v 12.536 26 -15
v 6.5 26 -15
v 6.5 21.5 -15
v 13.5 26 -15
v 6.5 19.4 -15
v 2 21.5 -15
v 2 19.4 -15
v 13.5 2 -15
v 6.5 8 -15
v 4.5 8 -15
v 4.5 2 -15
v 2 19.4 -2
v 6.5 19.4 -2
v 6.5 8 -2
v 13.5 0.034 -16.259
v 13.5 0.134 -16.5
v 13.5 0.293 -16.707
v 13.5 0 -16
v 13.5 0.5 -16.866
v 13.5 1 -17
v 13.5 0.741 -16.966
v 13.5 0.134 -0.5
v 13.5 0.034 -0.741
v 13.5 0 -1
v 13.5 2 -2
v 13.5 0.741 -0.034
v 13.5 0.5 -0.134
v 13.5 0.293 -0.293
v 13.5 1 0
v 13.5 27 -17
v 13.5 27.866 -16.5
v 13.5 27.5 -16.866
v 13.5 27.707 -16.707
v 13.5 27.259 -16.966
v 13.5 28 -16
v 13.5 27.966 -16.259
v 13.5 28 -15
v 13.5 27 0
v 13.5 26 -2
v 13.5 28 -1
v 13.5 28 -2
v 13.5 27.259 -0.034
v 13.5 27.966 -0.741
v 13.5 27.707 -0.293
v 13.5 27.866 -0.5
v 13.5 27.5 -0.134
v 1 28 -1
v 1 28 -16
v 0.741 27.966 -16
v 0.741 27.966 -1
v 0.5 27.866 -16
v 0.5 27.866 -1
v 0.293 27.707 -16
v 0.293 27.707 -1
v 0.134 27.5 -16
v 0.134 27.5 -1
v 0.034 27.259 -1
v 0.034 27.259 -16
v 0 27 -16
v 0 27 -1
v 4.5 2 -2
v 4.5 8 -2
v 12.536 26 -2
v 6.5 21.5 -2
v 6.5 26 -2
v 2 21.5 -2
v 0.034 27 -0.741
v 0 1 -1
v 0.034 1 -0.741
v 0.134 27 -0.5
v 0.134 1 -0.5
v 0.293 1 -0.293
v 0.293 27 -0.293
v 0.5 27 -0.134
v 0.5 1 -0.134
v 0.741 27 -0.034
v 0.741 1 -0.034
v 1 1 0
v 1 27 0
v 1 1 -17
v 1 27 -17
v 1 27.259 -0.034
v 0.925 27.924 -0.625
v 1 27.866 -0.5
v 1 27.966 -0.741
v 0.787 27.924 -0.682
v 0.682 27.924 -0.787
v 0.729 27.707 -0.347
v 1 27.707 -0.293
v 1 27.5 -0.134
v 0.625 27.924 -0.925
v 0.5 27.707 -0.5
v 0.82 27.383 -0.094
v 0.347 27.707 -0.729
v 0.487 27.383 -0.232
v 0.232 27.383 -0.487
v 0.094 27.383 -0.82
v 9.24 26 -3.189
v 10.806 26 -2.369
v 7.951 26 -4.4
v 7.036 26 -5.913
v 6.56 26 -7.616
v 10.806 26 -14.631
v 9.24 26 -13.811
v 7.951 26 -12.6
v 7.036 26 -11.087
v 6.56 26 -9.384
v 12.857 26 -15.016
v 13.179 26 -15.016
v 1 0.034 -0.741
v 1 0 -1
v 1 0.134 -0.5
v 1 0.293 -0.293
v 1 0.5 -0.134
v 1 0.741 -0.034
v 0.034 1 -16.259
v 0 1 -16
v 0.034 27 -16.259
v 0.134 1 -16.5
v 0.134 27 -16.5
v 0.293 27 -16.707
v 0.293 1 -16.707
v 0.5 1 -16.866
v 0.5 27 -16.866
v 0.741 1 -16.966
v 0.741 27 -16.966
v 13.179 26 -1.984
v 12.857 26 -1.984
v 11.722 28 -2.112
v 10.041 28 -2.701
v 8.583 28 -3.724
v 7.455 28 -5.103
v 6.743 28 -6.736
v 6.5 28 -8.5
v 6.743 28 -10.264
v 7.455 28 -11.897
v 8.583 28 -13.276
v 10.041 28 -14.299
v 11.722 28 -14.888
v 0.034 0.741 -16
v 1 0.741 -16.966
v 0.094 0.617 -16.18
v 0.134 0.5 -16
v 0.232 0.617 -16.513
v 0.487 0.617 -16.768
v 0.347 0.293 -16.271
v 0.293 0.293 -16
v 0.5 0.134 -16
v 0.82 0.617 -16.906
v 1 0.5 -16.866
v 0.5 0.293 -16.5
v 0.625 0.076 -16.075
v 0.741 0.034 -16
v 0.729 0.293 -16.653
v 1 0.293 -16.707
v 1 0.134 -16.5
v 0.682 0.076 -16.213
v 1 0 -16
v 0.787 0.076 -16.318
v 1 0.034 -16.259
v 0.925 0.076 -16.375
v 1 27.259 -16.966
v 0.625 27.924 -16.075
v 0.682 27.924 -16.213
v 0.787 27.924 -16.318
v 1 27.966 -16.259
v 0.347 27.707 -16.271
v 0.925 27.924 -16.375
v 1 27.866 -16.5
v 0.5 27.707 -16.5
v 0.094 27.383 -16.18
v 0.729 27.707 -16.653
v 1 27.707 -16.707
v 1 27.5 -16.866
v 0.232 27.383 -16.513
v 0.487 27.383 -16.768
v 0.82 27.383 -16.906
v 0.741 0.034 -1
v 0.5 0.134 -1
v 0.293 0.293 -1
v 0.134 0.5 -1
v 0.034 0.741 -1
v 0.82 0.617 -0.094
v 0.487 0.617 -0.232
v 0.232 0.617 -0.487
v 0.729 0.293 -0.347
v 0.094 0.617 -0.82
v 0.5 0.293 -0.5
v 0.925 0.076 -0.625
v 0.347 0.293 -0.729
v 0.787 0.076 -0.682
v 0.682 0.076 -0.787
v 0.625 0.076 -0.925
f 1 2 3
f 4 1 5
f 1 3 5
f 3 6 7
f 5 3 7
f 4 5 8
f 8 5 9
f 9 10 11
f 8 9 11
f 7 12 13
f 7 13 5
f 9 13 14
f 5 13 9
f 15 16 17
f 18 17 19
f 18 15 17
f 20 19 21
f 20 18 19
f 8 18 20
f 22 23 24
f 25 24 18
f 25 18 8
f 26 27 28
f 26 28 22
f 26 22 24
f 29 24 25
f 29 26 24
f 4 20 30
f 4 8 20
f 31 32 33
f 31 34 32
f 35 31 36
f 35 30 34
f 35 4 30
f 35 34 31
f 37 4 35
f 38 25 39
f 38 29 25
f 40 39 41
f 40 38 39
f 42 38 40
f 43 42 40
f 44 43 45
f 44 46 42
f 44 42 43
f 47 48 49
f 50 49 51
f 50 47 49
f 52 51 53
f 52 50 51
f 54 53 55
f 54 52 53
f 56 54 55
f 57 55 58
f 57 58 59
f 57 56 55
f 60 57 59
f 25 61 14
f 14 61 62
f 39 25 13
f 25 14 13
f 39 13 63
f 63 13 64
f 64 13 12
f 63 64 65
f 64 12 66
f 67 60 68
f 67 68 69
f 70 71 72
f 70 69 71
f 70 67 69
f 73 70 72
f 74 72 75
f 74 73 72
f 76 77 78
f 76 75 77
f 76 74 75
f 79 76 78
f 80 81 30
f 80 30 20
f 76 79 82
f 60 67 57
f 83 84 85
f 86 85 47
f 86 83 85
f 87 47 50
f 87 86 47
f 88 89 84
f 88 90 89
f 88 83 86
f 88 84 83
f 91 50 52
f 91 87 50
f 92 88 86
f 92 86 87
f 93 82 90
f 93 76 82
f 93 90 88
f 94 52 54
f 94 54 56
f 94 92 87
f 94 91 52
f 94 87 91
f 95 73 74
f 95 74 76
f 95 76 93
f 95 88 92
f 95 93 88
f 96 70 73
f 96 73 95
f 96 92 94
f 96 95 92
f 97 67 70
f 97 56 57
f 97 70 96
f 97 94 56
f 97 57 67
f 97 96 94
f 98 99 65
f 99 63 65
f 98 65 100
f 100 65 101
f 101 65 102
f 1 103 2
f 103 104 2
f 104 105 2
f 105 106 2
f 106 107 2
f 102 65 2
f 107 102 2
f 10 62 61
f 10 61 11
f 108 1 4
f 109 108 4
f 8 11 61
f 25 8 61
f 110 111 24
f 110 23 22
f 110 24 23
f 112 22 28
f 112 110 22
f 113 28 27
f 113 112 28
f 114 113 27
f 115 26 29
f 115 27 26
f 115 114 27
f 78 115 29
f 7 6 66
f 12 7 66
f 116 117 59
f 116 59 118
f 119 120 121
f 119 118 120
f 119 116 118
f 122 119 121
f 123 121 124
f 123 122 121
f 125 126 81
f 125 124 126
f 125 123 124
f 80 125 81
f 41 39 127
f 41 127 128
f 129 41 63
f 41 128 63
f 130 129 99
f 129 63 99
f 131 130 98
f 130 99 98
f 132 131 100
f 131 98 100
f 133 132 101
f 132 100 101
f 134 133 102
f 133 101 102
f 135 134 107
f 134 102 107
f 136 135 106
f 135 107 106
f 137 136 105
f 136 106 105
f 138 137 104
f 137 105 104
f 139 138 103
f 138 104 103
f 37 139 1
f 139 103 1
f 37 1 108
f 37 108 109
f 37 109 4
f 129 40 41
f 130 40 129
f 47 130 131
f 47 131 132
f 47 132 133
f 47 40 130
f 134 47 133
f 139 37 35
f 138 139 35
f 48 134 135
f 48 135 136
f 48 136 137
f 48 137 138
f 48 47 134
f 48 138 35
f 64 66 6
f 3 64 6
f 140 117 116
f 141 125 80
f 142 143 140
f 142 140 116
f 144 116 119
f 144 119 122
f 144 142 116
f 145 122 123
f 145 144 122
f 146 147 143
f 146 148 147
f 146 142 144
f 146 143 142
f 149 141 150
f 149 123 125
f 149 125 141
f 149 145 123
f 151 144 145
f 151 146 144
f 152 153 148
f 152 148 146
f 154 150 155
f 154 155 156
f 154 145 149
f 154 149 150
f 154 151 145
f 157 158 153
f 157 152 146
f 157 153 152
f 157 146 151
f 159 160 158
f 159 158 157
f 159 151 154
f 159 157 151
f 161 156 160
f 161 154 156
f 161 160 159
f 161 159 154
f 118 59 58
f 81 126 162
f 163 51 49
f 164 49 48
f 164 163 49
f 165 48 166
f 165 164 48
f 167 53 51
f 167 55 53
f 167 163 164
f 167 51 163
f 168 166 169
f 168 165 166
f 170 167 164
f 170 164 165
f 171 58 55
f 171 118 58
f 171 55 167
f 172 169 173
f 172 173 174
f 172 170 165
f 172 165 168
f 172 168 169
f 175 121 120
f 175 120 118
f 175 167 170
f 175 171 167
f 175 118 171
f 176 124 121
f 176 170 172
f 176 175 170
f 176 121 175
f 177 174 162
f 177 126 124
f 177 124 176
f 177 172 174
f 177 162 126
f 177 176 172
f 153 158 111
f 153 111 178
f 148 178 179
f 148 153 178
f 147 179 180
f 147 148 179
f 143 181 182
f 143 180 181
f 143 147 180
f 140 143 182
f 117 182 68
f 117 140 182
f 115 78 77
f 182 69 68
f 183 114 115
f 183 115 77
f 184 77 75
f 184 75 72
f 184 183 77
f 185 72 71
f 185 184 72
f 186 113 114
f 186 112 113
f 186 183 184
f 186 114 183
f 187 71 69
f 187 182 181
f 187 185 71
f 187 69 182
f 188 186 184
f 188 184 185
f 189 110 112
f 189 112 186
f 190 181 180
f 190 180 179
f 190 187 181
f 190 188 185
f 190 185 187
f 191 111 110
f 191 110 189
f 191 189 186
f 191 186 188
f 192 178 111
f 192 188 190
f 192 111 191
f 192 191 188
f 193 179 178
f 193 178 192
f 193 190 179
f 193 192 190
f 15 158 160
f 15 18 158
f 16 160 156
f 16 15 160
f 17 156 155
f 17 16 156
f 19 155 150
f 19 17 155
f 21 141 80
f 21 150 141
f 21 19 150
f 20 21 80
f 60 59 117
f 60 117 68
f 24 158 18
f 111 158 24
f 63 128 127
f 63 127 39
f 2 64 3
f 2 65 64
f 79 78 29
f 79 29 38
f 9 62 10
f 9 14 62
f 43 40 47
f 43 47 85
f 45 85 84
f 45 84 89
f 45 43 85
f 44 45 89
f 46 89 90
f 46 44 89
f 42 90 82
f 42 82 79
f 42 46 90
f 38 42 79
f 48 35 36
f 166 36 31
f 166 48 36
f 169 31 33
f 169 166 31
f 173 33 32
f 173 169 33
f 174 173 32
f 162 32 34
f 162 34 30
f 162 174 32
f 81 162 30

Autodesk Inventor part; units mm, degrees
ref_plane "YZ Plane" through (0, 0, 0) normal (1, 0, 0) x (0, 1, 0)
ref_plane "XZ Plane" through (0, 0, 0) normal (0, 1, 0) x (-1, 0, 0)
ref_plane "XY Plane" through (0, 0, 0) normal (0, 0, 1) x (1, 0, 0)
sketch "Esquisse1" plane through (0, 0, 0) normal (1, 0, 0) x (0, 1, 0)
  line L0 (0, 0) -> (28, 0)
  line L1 (28, 0) -> (28, -17)
  line L2 (28, -17) -> (0, -17)
  line L3 (0, -17) -> (0, 0)
  line L4 (0, 0) -> (0, -2)
  line L5 (0, -2) -> (2, -2)
  line L6 (28, -17) -> (28, -15)
  line L7 (28, -15) -> (26, -15)
  line L8 (26, -15) -> (2, -15)
  line L9 (2, -15) -> (2, -2)
  line L10 (2, -2) -> (26, -2)
  line L11 (26, -2) -> (26, -15)
  dimension "d1" = 28
  dimension "d2" = 17
  dimension "d3" = 2
  dimension "d4" = 2
  dimension "d5" = 2
  dimension "d6" = 2
extrude "Extrusion1" add sketch "Esquisse1" along normal blind 13.5 contours L0 L1 L7 L11 L10 L5 L3 | L5 L9 L8 L7 L1 L2 L3
sketch "Esquisse2" plane through (0, 0, 0) normal (-1, 0, 0) x (0, 0, 1)
  line L0 (-2, 2) -> (-2, 26) projected
  line L1 (-2, 26) -> (-15, 26)
  line L2 (-15, 26) -> (-15, 2)
  line L3 (-15, 2) -> (-2, 2)
  line L4 (-2, 2) -> (-2, 26)
  point P0 (0, 0)
extrude "Extrusion2" add sketch "Esquisse2" against normal blind 2
sketch "Esquisse3" plane through (2, 0, 0) normal (1, 0, 0) x (0, 0, -1)
  line L0 (15, 2) -> (2, 2) projected
  line L1 (2, 2) -> (2, 19.4)
  line L2 (2, 2) -> (2, 26) projected
  line L3 (2, 19.4) -> (2, 21.5)
  line L4 (2, 21.5) -> (2, 26)
  line L5 (2, 21.5) -> (2, 26)
  line L6 (15, 2) -> (2, 2)
  line L7 (2, 2) -> (2, 19.4)
  line L8 (2, 19.4) -> (15, 19.4)
  line L9 (15, 19.4) -> (15, 2)
  line L10 (2, 26) -> (15, 26) projected
  line L11 (15, 26) -> (2, 26)
  line L12 (2, 26) -> (2, 21.5)
  line L13 (2, 21.5) -> (15, 21.5)
  line L14 (15, 21.5) -> (15, 26)
  point P0 (0, 0)
  dimension "d11" = 17.4
  dimension "d12" = 2.1
extrude "Extrusion3" add sketch "Esquisse3" along normal blind 4.5
sketch "Esquisse4" plane through (6.5, 0, 0) normal (1, 0, 0) x (0, 0, -1)
  line L0 (15, 2) -> (2, 2) projected
  line L1 (15, 2) -> (2, 2)
  line L2 (2, 2) -> (2, 8)
  line L3 (2, 8) -> (15, 8)
  line L4 (15, 8) -> (15, 2)
  point P0 (0, 0)
  dimension "d15" = 6
extrude "Extrusion4" cut sketch "Esquisse4" against normal blind 2
sketch "Esquisse5" plane through (13.5, 26, -15) normal (0, -1, 0) x (1, 0, 0)
  line L0 (-9, 13) -> (0, 13) projected
  line L1 (-9, 0) -> (0, 0) projected
  arc A0 (0, 13) -> (0, 0) centre (-0.4821, 6.5) ccw
  line L2 (0, 0) -> (0, 13) projected
  line L3 (0, 13) -> (0, 0)
  point P0 (-13.5, 15)
extrude "Extrusion5" cut sketch "Esquisse5" against normal up to next
fillet "Congé1" radius 1 1 edges at (0, 14, 0)
fillet "Congé2" radius 1 1 edges at (0, 14, -17)
fillet "Congé3" radius 1 5 edges at (0.2929, 28, -0.2929) (7.25, 28, 0) (0.2929, 28, -16.7071) (7.25, 28, -17) (0, 28, -8.5)
fillet "Congé4" radius 1 5 edges at (0.2929, 0, -16.7071) (7.25, 0, -17) (0.2929, 0, -0.2929) (7.25, 0, 0) (0, 0, -8.5)
properties part number "Support servomoteur"
